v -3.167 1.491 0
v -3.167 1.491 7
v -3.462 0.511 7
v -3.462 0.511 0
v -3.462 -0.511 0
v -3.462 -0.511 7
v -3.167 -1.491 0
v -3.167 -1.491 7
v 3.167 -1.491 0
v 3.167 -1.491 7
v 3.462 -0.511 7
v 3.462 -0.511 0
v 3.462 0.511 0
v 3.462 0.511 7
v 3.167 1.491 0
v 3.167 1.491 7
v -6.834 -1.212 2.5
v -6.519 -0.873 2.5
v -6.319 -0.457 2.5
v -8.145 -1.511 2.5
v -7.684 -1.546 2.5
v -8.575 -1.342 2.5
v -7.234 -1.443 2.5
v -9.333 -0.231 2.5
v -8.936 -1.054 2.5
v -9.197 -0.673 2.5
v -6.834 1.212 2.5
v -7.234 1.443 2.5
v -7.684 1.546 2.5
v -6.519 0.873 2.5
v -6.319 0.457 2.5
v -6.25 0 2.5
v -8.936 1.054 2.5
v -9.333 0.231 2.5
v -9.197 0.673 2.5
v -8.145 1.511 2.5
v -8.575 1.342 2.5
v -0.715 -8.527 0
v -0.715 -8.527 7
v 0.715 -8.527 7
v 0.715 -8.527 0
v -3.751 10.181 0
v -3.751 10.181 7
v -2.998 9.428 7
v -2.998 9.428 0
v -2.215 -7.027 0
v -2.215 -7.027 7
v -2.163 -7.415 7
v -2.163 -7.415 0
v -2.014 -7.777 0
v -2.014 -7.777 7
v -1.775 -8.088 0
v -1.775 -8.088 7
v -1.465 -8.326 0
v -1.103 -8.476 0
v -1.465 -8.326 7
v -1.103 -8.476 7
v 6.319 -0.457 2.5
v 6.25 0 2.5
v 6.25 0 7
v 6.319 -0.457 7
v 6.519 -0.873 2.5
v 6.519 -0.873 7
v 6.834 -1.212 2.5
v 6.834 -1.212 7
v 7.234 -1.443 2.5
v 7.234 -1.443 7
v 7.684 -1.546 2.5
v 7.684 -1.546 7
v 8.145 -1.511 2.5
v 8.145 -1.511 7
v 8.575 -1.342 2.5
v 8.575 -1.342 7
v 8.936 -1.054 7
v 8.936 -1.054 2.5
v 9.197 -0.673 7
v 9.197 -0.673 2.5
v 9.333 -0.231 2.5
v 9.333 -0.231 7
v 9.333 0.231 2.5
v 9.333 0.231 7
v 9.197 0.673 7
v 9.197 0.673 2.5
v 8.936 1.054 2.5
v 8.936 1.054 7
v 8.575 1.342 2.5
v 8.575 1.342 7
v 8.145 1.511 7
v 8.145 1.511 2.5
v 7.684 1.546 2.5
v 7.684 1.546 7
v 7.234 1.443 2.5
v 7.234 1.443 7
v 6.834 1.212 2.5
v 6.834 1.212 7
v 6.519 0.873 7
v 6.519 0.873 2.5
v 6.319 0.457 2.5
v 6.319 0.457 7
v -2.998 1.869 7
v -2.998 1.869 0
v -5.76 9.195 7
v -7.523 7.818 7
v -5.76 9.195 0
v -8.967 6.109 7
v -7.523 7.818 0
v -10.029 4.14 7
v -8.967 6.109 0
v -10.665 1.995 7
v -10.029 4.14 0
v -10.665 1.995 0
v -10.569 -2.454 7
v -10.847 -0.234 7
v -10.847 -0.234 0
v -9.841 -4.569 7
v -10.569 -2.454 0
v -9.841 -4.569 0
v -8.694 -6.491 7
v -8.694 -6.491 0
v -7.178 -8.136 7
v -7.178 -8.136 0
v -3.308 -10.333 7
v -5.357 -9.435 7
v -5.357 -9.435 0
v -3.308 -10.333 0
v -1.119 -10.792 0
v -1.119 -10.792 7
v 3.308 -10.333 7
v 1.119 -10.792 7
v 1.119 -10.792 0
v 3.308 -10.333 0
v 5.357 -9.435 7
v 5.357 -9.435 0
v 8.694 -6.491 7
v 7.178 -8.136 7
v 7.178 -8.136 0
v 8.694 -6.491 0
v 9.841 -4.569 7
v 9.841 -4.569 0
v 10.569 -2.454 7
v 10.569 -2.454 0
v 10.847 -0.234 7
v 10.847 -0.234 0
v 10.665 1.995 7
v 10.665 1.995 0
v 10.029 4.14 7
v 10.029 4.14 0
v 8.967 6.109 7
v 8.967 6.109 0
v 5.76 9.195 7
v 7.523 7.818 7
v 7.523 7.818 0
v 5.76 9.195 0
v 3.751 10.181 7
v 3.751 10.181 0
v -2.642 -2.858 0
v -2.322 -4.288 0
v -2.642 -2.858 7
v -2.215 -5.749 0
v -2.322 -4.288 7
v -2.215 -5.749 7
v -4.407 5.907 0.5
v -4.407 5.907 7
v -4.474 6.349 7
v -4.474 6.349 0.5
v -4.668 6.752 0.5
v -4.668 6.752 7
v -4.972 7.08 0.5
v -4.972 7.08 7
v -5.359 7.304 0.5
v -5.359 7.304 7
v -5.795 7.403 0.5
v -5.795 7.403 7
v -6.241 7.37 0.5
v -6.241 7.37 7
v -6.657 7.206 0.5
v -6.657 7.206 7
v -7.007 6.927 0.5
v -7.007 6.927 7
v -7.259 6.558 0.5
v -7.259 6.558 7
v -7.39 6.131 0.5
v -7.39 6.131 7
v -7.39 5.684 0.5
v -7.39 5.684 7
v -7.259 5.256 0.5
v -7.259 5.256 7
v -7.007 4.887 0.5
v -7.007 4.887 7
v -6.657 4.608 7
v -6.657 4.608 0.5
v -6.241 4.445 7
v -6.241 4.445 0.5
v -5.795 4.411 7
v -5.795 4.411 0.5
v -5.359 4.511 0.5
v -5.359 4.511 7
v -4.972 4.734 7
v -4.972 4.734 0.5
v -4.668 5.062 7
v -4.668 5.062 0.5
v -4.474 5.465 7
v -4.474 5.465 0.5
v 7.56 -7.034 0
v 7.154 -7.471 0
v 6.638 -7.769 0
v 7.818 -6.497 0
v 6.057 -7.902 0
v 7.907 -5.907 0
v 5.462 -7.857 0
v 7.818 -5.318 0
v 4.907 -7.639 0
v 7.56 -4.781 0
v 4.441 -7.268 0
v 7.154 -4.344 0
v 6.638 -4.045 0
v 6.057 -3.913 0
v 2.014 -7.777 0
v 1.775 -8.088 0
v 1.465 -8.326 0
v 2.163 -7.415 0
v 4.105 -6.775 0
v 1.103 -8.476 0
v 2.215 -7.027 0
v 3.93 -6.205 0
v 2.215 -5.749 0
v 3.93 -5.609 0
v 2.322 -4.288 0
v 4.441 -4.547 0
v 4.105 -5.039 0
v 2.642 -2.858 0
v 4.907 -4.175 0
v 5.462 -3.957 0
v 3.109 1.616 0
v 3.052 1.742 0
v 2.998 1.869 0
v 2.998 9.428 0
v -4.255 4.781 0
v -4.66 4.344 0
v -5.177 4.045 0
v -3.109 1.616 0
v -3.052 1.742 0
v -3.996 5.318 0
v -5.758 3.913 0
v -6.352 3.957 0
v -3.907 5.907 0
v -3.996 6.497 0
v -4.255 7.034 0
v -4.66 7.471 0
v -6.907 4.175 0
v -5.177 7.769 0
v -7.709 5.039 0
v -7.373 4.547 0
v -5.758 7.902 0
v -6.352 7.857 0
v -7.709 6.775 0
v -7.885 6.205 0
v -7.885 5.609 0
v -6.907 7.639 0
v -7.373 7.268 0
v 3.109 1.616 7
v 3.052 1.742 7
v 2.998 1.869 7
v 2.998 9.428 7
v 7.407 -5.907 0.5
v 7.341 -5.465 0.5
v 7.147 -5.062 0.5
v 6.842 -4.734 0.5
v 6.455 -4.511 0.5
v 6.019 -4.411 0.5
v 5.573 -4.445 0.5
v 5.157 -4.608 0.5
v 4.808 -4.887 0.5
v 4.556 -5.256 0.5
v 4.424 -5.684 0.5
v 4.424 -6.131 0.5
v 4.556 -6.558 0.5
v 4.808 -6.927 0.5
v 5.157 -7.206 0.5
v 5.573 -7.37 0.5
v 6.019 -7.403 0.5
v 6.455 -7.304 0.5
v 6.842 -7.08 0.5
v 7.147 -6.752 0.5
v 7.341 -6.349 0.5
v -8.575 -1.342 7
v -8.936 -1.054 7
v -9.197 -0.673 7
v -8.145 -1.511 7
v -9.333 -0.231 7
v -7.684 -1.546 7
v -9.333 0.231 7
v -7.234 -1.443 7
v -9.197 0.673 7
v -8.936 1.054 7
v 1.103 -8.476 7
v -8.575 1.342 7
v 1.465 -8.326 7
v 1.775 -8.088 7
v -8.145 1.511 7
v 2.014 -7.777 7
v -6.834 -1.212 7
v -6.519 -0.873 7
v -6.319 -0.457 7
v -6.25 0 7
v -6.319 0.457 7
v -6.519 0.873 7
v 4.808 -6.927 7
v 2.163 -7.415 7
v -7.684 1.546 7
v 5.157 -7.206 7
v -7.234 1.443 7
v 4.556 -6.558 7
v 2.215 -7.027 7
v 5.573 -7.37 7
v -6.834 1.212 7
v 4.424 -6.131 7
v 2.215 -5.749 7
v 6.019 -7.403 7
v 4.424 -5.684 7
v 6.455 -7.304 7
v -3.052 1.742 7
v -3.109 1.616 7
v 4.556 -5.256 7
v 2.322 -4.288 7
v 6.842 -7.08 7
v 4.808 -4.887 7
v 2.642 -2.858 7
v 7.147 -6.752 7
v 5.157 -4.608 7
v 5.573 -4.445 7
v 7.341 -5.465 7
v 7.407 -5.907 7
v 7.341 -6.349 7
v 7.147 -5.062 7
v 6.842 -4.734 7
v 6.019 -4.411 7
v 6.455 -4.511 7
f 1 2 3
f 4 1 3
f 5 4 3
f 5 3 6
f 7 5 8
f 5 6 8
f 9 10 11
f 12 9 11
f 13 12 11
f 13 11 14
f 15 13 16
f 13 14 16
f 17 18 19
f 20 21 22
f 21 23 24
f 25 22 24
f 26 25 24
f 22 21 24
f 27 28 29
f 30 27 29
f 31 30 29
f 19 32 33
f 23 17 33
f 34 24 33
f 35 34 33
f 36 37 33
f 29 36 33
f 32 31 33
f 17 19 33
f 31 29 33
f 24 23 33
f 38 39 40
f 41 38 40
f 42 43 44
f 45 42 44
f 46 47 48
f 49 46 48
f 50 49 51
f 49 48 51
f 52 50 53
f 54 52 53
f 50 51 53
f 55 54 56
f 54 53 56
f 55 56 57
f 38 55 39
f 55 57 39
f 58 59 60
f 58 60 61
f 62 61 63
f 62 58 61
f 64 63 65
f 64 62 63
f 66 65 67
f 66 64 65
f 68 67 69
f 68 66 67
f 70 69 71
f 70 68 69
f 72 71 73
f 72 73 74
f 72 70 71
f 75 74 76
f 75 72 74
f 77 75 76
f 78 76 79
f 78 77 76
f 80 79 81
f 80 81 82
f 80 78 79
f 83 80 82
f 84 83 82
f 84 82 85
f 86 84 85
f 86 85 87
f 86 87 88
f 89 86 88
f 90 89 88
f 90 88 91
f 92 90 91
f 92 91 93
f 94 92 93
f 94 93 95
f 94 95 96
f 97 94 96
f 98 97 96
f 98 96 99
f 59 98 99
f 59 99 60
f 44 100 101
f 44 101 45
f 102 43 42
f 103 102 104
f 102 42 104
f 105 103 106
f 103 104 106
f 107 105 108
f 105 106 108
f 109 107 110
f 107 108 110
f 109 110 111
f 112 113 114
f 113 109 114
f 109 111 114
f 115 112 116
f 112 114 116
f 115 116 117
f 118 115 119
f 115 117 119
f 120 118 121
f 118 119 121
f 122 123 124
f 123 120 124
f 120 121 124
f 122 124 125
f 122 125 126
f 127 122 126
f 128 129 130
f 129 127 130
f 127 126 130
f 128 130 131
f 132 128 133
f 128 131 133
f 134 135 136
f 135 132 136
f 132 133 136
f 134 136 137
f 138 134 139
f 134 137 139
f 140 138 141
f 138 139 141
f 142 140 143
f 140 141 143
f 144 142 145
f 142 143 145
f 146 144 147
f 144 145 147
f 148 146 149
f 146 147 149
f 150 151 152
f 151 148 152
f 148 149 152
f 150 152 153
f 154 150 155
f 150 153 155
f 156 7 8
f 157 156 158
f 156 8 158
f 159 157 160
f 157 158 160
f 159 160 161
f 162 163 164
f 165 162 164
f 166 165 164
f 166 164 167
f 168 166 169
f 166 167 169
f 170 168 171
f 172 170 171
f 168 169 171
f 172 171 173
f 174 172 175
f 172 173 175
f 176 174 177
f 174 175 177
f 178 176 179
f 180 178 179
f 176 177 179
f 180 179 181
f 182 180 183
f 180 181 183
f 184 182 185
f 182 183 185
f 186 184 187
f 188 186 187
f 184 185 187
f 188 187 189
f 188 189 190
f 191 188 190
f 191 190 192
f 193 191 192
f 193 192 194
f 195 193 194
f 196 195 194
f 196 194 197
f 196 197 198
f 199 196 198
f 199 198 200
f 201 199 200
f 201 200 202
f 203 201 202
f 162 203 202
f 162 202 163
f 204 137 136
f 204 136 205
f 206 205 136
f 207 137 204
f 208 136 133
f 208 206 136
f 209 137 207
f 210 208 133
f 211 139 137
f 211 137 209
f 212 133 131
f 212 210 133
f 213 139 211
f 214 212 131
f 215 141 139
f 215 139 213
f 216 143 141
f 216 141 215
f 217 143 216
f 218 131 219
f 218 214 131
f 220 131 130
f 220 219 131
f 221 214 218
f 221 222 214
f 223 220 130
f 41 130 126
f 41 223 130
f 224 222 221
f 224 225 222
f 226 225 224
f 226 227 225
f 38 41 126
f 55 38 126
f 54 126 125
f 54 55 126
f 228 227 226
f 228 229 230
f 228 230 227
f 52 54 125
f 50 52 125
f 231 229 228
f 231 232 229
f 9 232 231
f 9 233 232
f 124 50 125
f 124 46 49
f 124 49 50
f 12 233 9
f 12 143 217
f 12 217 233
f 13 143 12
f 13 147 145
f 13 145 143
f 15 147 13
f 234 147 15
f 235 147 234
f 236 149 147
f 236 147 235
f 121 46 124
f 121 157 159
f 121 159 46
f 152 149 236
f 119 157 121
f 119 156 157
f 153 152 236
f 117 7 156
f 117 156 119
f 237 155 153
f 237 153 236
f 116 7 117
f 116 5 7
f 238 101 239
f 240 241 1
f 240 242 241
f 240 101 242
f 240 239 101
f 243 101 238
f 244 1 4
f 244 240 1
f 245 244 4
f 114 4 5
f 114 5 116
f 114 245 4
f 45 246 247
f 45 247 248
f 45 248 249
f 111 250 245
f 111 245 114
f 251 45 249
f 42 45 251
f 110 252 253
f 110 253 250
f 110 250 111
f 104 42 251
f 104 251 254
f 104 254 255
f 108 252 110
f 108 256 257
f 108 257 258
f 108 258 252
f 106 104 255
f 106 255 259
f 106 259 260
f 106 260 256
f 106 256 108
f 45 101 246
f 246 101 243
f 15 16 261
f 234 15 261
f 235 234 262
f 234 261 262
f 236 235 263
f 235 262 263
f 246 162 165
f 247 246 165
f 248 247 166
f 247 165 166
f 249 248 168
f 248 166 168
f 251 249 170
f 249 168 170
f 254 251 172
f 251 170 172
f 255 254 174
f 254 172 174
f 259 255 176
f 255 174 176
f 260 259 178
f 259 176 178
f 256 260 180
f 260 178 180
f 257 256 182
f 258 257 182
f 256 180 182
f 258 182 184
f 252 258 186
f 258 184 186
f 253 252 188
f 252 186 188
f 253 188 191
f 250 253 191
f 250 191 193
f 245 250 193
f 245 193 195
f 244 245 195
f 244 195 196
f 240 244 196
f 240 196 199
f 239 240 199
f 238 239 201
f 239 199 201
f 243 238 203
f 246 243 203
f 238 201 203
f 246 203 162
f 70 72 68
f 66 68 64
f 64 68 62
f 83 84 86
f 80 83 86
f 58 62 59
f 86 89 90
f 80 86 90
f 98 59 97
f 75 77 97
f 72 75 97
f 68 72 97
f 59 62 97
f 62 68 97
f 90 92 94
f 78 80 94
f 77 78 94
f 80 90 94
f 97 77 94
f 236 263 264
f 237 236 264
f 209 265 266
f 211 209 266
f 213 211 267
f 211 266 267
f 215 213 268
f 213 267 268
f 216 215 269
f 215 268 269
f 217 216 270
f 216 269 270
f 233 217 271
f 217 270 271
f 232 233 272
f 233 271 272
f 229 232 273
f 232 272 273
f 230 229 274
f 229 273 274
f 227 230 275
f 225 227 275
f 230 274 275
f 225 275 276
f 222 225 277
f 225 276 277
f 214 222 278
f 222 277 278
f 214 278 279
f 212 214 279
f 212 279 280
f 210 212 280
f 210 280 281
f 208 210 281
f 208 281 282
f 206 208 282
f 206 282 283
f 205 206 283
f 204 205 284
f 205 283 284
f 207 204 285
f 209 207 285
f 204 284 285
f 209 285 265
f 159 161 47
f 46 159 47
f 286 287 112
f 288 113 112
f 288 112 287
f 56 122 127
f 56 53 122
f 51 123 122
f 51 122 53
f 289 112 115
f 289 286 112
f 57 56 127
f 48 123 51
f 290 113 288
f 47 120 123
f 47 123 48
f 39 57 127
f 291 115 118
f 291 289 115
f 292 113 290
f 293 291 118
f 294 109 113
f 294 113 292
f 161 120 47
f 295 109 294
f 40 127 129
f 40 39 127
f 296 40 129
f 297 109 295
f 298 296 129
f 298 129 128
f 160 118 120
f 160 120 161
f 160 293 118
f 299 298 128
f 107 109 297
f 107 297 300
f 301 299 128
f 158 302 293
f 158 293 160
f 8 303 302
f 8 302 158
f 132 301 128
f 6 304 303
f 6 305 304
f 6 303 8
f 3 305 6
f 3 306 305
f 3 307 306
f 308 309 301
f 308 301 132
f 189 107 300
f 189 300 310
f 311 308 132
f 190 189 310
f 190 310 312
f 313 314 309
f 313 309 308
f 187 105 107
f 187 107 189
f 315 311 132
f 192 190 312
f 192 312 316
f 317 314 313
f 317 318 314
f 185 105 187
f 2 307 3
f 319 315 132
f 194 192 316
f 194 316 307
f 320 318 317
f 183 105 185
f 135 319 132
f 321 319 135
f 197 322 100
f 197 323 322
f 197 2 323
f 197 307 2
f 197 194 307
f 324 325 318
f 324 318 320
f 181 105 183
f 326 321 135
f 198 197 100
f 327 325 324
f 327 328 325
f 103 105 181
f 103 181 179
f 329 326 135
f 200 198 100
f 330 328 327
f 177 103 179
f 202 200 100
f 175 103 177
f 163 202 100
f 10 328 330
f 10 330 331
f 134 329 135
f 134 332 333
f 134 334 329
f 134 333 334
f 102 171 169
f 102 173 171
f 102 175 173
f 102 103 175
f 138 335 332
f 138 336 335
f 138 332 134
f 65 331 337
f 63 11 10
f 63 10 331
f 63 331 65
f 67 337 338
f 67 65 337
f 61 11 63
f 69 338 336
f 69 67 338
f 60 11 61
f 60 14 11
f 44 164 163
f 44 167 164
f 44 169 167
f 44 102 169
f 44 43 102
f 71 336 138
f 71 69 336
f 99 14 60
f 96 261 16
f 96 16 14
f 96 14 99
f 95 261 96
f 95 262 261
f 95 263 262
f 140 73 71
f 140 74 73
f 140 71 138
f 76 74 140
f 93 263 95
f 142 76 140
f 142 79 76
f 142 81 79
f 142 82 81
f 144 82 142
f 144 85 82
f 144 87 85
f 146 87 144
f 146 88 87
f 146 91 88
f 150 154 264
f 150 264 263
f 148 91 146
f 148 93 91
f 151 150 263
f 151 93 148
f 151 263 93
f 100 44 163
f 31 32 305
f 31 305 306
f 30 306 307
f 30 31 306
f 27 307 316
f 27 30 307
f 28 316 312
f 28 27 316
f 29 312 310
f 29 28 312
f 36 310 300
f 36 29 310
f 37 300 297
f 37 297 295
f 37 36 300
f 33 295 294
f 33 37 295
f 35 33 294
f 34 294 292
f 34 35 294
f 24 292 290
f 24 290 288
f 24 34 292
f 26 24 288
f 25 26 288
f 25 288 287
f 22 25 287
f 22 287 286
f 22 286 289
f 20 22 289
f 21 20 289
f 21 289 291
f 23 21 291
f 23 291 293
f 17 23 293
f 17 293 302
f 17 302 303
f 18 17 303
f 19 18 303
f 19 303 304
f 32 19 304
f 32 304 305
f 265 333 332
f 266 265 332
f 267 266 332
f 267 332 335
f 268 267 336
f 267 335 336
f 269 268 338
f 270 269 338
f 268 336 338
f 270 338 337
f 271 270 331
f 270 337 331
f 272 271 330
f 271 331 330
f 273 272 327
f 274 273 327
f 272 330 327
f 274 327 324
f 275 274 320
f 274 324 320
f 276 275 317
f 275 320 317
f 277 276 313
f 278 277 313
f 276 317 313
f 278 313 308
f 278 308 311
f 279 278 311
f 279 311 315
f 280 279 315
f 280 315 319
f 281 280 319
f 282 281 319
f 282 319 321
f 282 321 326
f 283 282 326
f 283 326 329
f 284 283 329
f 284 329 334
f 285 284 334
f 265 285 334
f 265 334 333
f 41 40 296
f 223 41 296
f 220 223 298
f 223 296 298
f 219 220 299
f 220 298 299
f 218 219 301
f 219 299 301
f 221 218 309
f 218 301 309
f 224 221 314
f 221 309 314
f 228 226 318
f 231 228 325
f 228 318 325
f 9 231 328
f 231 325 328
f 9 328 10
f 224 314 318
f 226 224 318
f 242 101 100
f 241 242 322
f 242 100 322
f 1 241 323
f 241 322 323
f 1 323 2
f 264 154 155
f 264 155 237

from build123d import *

# Parameters (mm, degrees)
SKETCH1_R           = 10.85
SKETCH1_R_2         = 1.55
BOSS_EXTRUDE1_DEPTH = 7
CUT_EXTRUDE1_DEPTH  = 10
SKETCH3_R           = 1.55
BOSS_EXTRUDE2_DEPTH = 2.5
SKETCH6_W           = 5.995922228
SKETCH6_H           = 11.403727684
CUT_EXTRUDE3_DEPTH  = 11.5
CHAMFER2_SIZE       = 1
SKETCH7_R           = 1.5
CUT_EXTRUDE4_DEPTH  = 11.5
CHAMFER3_SIZE       = 0.5


with BuildPart() as part:
    # Sketch1 → Boss-Extrude1 (new body)
    with BuildSketch(Plane.XY):
        Circle(SKETCH1_R)
        with Locations((-7.8, 0)):
            Circle(SKETCH1_R_2, mode=Mode.SUBTRACT)
        with Locations(Location((7.8, 0, 0), (0, 0, 180))):
            Circle(SKETCH1_R_2, mode=Mode.SUBTRACT)
    extrude(amount=BOSS_EXTRUDE1_DEPTH)

    # Sketch2 → Cut-Extrude1 (cut)
    with BuildSketch(Plane.XY.offset(7)):
        with BuildLine():
            Line((-2.214560219, -5.749305929), (-2.214560219, -7.027203312))
            ThreePointArc((-2.214560219, -7.027203312), (-1.775220391, -8.087863484), (-0.714560219, -8.527203312))
            Line((-0.714560219, -8.527203312), (0.714560219, -8.527203312))
            ThreePointArc((0.714560219, -8.527203312), (1.775220391, -8.087863484), (2.214560219, -7.027203312))
            Line((2.214560219, -7.027203312), (2.214560219, -5.749305929))
            ThreePointArc((2.214560219, -5.749305929), (2.4555074, -3.56735999), (3.166737835, -1.490560796))
            ThreePointArc((3.166737835, -1.490560796), (3.5, 0), (3.166737835, 1.490560796))
            ThreePointArc((3.166737835, 1.490560796), (2.4555074, 3.56735999), (2.214560219, 5.749305929))
            Line((2.214560219, 5.749305929), (2.214560219, 8.304826852))
            ThreePointArc((2.214560219, 8.304826852), (1.775220391, 9.365487023), (0.714560219, 9.804826852))
            Line((0.714560219, 9.804826852), (-0.714560219, 9.804826852))
            ThreePointArc((-0.714560219, 9.804826852), (-1.775220391, 9.365487023), (-2.214560219, 8.304826852))
            Line((-2.214560219, 8.304826852), (-2.214560219, 5.749305929))
            ThreePointArc((-2.214560219, 5.749305929), (-2.4555074, 3.56735999), (-3.166737835, 1.490560796))
            ThreePointArc((-3.166737835, 1.490560796), (-3.5, 0), (-3.166737835, -1.490560796))
            ThreePointArc((-3.166737835, -1.490560796), (-2.4555074, -3.56735999), (-2.214560219, -5.749305929))
        make_face()
    extrude(amount=-CUT_EXTRUDE1_DEPTH, mode=Mode.SUBTRACT)

    # Sketch3 → Boss-Extrude2 (add)
    with BuildSketch(Plane(origin=(0, 0, 0), x_dir=(-1, 0, 0), z_dir=(0, 0, -1))):
        with Locations((-7.8, 0)):
            Circle(SKETCH3_R)
        with Locations((7.8, 0)):
            Circle(SKETCH3_R)
    extrude(amount=-BOSS_EXTRUDE2_DEPTH)

    # Sketch6 → Cut-Extrude3 (cut)
    with BuildSketch(Plane.XY.offset(7)):
        with Locations((0, 5.701863842)):
            Rectangle(SKETCH6_W, SKETCH6_H)
    extrude(amount=-CUT_EXTRUDE3_DEPTH, mode=Mode.SUBTRACT)

    # Chamfer2
    # the kernel refuses this chamfer: 1, 0.808160216 mm, written as the material it takes off along each edge
    with BuildSketch(Plane(origin=(-2.997961114, 10.427594601, 9.571682988), x_dir=(-0.9503340771083855, -0.3112316530922798, 0), z_dir=(0, 0, -1))) as chamfer2_piece_1:
        with BuildLine():
            Line((0.792665793, 0), (CHAMFER2_SIZE * 0.311231653092, -CHAMFER2_SIZE * 0.950334077108))
            Line((CHAMFER2_SIZE * 0.311231653092, -CHAMFER2_SIZE * 0.950334077108), (0, 0))
            ThreePointArc((0, 0), (0.405362345, 0.007237358), (0.792665793, 0))
        make_face()
    extrude(amount=12.143365976, mode=Mode.SUBTRACT)
    with BuildSketch(Plane(origin=(2.997961114, 10.427594601, 9.571682988), x_dir=(0.950334077108385, -0.31123165309228096, 0), z_dir=(0, 0, -1))) as chamfer2_piece_2:
        with BuildLine():
            Line((0.792665793, 0), (CHAMFER2_SIZE * 0.311231653092, CHAMFER2_SIZE * 0.950334077108))
            Line((CHAMFER2_SIZE * 0.311231653092, CHAMFER2_SIZE * 0.950334077108), (0, 0))
            ThreePointArc((0, 0), (0.405362345, -0.007237358), (0.792665793, 0))
        make_face()
    extrude(amount=12.143365976, mode=Mode.SUBTRACT)

    # Sketch7 → Cut-Extrude4 (cut)
    with BuildSketch(Plane.XY.offset(7)):
        with Locations((-5.907204398, 5.907204398)):
            Circle(SKETCH7_R)
        with Locations((5.907204398, -5.907204398)):
            Circle(SKETCH7_R)
    extrude(amount=-CUT_EXTRUDE4_DEPTH, mode=Mode.SUBTRACT)

    # Chamfer3
    chamfer3_edges = [part.edges().sort_by_distance(p)[0] for p in [
        (-7.407204398, 5.907204398, 0),
        (4.407204398, -5.907204398, 0),
    ]]
    chamfer(chamfer3_edges, length=CHAMFER3_SIZE)


solid = part.part
